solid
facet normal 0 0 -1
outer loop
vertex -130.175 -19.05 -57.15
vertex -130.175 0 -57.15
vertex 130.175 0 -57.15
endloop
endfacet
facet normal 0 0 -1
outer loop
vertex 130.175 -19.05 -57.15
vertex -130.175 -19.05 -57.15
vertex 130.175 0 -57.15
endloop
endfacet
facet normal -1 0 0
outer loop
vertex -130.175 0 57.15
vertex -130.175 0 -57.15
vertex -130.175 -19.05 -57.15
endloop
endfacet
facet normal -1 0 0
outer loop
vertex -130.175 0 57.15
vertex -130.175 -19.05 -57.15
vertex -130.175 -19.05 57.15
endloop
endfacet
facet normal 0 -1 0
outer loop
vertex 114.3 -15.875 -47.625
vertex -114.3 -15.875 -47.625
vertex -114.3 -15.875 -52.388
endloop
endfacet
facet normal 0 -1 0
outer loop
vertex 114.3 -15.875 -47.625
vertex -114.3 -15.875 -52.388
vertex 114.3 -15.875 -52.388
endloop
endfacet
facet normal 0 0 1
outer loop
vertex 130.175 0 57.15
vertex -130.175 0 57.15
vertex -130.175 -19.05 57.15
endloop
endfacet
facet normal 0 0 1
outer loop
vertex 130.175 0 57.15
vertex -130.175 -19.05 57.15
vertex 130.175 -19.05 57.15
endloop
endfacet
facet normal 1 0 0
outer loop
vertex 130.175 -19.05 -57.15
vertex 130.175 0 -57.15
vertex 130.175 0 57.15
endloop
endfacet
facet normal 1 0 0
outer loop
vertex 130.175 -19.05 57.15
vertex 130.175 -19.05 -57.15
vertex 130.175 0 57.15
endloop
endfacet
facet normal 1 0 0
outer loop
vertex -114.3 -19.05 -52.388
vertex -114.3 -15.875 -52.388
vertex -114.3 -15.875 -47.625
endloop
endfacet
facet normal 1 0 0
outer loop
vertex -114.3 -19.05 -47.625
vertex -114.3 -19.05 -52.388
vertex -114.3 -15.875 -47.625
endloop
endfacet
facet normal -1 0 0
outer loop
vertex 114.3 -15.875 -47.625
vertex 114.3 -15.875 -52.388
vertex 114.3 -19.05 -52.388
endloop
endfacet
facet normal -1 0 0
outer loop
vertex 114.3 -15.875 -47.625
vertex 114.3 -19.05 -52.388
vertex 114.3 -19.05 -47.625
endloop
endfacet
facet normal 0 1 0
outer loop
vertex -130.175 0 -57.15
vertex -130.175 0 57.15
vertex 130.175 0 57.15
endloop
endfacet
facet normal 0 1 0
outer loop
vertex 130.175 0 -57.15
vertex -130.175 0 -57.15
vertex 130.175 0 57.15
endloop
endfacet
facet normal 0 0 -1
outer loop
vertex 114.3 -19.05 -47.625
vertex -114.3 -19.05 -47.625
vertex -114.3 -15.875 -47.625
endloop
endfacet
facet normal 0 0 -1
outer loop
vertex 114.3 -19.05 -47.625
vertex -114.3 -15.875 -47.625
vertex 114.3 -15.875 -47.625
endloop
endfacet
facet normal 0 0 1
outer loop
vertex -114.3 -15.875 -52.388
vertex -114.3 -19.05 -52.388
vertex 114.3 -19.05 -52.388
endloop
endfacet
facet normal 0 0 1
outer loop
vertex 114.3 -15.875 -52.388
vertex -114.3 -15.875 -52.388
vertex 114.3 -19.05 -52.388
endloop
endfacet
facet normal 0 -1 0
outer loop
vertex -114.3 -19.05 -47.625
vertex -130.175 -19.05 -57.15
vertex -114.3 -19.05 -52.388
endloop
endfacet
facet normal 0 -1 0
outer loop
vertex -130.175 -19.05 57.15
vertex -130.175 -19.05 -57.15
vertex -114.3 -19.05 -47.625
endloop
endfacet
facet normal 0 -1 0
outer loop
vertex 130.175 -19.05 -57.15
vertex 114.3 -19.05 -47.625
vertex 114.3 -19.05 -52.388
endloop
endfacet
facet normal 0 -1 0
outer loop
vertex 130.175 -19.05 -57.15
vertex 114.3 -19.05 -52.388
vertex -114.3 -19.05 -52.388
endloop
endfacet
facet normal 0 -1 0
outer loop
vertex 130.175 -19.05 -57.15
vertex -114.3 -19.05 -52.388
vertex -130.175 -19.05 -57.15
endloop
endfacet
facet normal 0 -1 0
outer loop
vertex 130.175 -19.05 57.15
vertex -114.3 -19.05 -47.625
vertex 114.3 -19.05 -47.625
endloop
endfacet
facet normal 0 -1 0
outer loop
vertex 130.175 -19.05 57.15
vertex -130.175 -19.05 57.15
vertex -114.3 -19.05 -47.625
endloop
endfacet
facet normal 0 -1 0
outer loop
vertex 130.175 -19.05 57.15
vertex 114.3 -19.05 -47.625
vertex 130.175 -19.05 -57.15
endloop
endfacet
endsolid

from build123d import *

# Parameters (mm, degrees)
F0_W     = 260.35
F0_H     = 114.3
F1_DEPTH = 19.05
F2_W     = 260.35
F2_H     = 4.7625
F3_DEPTH = 3.175
F4_W     = 15.875
F4_H     = 4.7625
F5_DEPTH = 3.175


with BuildPart() as f1:
    # F0 (on Front) → F1 (new body)
    with BuildSketch(Plane.XZ):
        Rectangle(F0_W, F0_H)
    extrude(amount=F1_DEPTH)

    # F2 (on face) → F3 (cut)
    with BuildSketch(Plane.XZ.offset(19.05)):
        with Locations((0, -50.00625)):
            Rectangle(F2_W, F2_H)
    extrude(amount=-F3_DEPTH, mode=Mode.SUBTRACT)

    # F4 (on face) → F5 (join)
    with BuildSketch(Plane.XZ.offset(15.875)):
        with Locations((122.2375, -50.00625)):
            Rectangle(F4_W, F4_H)
        with Locations((-122.2375, -50.00625)):
            Rectangle(F4_W, F4_H)
    extrude(amount=F5_DEPTH)


solid = f1.part
